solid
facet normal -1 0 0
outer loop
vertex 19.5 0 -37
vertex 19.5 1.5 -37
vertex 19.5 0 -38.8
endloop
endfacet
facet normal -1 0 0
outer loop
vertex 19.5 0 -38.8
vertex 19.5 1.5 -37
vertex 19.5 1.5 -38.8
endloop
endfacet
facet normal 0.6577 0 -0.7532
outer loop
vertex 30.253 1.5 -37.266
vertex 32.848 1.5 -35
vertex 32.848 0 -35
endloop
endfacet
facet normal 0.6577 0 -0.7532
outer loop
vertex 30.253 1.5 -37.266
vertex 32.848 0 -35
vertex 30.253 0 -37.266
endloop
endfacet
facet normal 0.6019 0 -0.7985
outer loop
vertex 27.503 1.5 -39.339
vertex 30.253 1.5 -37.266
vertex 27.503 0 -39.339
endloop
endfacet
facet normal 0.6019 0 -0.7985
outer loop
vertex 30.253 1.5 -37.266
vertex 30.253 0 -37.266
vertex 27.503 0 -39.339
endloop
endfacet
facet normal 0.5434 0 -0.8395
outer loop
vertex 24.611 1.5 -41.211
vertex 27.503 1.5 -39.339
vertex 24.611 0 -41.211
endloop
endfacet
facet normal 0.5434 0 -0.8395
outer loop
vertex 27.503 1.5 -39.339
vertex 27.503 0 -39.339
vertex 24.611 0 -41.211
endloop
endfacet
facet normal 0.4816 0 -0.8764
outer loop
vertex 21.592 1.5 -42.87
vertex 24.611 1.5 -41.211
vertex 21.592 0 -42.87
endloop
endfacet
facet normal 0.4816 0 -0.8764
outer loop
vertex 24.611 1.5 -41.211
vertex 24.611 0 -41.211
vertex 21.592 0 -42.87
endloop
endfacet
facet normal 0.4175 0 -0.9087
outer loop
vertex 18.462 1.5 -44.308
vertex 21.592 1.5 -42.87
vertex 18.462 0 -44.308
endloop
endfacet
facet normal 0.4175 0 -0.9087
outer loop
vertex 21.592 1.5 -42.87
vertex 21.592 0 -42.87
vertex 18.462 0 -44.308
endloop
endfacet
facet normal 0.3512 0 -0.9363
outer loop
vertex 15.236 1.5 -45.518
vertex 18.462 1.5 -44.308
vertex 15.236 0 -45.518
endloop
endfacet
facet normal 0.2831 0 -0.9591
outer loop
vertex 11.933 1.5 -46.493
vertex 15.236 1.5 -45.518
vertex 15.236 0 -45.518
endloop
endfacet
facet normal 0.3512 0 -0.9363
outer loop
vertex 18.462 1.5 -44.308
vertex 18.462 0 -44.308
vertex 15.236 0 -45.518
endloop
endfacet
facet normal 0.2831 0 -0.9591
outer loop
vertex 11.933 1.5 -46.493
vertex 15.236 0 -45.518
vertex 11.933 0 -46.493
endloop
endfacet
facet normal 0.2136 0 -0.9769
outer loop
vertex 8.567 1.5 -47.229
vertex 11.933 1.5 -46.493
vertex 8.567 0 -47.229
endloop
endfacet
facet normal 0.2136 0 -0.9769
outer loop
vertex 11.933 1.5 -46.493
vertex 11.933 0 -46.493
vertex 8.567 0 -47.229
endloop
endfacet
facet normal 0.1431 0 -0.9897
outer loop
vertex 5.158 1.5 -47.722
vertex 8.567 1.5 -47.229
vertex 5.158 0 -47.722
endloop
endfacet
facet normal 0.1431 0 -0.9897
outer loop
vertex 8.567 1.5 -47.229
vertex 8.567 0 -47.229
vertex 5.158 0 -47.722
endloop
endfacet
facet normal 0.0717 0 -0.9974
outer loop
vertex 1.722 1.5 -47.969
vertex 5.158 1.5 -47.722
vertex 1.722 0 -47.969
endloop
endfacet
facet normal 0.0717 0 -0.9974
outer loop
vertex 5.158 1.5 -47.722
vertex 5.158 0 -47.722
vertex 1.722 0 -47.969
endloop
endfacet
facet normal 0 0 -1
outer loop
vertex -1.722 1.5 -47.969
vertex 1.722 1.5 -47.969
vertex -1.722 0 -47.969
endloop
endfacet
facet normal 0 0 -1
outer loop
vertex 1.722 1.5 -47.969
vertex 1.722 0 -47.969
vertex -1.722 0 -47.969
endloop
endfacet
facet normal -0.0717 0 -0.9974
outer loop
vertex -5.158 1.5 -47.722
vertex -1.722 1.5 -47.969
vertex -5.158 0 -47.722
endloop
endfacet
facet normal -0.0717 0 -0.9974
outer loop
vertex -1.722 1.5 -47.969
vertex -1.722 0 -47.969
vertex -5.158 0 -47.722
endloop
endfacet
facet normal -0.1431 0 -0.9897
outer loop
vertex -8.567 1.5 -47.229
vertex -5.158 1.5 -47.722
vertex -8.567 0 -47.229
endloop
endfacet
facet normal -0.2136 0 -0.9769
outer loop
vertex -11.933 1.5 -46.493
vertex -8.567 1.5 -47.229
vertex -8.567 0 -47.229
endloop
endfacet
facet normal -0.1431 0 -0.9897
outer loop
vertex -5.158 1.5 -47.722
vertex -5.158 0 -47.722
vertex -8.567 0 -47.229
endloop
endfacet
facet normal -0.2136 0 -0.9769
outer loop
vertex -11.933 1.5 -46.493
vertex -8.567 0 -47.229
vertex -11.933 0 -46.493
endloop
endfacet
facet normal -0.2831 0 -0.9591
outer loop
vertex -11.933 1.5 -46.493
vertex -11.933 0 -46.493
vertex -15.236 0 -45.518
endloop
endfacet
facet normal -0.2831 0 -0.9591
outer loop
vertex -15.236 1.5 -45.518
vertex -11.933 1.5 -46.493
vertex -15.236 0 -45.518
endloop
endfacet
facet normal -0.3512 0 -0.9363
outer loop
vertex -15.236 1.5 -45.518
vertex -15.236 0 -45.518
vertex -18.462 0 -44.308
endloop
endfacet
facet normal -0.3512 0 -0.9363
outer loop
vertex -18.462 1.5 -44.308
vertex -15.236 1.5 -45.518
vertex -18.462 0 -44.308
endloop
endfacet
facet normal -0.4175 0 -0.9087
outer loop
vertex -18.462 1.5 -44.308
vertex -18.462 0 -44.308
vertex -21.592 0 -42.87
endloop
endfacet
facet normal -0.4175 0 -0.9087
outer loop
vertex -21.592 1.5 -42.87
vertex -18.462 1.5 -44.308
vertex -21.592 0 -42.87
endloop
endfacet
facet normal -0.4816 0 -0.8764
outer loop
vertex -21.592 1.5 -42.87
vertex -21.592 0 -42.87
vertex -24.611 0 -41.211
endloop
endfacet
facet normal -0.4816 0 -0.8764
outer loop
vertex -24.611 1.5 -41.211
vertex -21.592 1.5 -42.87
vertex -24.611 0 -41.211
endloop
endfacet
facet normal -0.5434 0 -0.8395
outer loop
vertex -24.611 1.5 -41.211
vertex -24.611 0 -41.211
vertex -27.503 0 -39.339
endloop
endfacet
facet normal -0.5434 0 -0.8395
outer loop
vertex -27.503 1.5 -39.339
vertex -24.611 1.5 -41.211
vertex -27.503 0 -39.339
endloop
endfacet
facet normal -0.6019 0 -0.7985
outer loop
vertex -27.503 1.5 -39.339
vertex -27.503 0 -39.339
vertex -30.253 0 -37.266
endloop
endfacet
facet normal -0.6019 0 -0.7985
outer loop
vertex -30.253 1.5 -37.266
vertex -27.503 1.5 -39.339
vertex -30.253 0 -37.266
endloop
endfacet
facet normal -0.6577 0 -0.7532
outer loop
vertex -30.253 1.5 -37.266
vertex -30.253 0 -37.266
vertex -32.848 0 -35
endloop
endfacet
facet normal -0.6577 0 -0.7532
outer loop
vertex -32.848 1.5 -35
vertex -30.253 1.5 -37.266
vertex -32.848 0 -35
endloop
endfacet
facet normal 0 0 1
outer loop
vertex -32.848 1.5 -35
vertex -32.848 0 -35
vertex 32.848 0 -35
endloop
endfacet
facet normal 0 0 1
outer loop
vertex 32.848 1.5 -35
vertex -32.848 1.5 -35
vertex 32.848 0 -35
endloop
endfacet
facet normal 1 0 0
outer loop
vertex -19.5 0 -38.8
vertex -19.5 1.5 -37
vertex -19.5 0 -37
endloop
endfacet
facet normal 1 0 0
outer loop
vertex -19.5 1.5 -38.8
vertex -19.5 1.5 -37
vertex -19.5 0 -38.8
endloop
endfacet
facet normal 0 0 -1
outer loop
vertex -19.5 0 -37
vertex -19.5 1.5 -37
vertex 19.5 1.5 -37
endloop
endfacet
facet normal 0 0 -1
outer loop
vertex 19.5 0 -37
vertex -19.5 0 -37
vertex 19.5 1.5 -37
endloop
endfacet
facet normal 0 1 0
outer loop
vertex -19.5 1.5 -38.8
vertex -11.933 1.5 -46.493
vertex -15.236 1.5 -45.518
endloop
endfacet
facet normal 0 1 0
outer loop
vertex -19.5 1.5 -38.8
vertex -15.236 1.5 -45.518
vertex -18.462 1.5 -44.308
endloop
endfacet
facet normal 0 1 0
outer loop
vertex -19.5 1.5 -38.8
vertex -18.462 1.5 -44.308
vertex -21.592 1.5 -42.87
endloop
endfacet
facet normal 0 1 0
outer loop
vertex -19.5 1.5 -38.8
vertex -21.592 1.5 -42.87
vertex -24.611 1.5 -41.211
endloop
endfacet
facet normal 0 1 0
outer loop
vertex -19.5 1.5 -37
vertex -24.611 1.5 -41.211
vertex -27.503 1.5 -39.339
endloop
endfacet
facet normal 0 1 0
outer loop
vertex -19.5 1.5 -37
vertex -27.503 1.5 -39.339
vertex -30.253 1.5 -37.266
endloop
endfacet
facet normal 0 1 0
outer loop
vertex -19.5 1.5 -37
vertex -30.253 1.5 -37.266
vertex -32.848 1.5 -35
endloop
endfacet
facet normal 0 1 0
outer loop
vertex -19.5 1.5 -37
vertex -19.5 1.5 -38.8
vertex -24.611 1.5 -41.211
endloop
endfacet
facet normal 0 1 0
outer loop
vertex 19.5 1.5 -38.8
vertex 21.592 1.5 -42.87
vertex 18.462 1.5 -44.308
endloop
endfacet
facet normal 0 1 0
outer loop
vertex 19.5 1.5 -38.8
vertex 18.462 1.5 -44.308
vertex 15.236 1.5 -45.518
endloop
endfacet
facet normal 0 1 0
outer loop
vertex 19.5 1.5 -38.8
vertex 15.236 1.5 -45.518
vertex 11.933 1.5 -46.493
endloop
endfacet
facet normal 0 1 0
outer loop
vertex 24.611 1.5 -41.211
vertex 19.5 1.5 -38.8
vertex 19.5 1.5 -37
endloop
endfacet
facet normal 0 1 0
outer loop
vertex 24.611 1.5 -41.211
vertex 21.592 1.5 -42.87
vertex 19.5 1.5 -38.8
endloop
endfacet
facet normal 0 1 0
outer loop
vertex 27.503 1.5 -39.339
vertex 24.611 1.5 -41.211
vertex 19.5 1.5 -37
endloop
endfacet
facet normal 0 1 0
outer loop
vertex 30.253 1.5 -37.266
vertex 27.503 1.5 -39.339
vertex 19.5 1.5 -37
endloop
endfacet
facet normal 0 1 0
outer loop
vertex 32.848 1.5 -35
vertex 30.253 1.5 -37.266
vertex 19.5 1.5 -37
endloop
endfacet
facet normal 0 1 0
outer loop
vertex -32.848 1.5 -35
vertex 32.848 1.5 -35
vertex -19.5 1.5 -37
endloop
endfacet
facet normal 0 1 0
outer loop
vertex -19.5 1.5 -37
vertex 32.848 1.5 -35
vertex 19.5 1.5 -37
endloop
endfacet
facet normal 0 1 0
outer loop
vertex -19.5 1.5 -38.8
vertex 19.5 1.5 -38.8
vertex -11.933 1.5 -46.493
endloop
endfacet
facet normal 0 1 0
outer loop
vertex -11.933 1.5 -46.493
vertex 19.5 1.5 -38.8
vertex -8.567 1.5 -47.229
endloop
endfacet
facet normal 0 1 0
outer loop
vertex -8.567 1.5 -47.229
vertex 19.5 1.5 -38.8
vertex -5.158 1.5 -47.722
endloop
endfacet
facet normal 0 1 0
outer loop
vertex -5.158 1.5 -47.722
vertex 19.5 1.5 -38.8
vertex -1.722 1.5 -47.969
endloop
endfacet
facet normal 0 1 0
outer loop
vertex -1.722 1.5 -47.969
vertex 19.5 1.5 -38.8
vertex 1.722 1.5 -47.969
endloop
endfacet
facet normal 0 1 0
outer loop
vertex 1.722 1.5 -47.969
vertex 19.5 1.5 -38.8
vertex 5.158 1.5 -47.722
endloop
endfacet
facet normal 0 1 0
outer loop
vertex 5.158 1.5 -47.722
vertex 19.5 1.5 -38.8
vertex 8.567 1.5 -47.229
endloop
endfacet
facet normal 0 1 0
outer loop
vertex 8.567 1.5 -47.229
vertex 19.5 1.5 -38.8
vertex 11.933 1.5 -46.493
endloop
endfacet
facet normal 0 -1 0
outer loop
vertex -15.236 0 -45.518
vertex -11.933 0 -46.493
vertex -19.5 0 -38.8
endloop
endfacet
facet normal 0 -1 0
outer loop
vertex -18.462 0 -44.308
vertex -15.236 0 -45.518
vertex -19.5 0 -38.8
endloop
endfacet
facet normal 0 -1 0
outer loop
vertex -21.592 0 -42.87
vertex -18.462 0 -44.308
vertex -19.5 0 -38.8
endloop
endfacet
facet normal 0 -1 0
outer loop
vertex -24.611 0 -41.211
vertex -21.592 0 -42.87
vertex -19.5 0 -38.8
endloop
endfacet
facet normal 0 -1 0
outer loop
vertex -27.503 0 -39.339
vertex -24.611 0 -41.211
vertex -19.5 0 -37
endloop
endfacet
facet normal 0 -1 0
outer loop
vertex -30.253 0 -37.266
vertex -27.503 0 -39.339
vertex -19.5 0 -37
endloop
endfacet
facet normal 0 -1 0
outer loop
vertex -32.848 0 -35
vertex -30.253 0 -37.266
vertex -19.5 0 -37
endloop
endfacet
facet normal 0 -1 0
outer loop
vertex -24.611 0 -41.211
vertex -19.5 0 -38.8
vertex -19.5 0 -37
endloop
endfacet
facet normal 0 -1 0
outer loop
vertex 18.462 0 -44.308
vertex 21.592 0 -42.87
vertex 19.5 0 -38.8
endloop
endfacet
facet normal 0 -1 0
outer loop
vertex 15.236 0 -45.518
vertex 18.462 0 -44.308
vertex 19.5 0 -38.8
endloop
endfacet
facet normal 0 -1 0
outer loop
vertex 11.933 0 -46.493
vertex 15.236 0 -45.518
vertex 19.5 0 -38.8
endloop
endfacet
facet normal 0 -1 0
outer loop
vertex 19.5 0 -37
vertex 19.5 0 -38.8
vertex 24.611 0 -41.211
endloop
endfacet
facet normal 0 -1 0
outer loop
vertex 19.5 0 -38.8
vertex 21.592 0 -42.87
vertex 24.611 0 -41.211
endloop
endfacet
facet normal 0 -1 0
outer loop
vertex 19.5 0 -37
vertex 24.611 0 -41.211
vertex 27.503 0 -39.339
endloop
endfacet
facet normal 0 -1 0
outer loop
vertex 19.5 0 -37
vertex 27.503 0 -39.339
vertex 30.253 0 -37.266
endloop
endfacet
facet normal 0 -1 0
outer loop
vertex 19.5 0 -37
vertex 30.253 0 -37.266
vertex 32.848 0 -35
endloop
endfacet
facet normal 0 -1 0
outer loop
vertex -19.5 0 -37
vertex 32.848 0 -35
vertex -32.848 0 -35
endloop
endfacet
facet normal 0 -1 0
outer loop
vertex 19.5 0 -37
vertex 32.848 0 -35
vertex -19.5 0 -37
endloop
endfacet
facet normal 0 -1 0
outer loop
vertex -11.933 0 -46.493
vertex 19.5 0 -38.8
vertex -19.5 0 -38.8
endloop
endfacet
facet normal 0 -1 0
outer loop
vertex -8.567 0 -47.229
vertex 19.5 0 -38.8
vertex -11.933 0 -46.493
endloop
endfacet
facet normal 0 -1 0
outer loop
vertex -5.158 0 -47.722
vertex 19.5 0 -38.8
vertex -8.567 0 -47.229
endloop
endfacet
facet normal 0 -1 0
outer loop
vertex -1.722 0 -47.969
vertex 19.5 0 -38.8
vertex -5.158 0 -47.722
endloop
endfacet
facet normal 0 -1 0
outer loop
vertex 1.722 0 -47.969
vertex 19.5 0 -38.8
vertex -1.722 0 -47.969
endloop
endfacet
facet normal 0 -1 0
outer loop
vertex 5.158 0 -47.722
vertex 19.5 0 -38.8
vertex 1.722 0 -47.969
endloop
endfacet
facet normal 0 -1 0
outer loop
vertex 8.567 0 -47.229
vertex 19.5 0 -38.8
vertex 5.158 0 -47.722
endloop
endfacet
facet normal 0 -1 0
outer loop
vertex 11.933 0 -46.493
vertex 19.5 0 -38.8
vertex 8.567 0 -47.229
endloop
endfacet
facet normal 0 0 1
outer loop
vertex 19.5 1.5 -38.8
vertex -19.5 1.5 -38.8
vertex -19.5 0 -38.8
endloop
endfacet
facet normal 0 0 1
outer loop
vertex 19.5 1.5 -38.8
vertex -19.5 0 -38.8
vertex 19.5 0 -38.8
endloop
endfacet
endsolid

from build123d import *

# Parameters (mm, degrees)
SKETCH1_R           = 48
BOSS_EXTRUDE1_DEPTH = 1.5
CUT_EXTRUDE1_START  = -1.5
CUT_EXTRUDE1_DEPTH  = 1.5
SKETCH3_W           = 39
SKETCH3_H           = 1.8
CUT_EXTRUDE2_DEPTH  = 1.5


with BuildPart() as part:
    # Sketch1 → Boss-Extrude1 (new body)
    with BuildSketch(Plane(origin=(0, 0, 0), x_dir=(1, 0, 0), z_dir=(0, 1, 0))):
        with Locations(Location((0, 0, 0), (0, 0, 270))):
            Circle(SKETCH1_R)
    extrude(amount=BOSS_EXTRUDE1_DEPTH)

    # Sketch2 → Cut-Extrude1 (cut)
    with BuildSketch(Plane(origin=(0, 1.5, 0), x_dir=(1, 0, 0), z_dir=(0, 1, 0)).offset(CUT_EXTRUDE1_START)):
        with BuildLine():
            Line((-32.848135411, 35), (32.848135411, 35))
            ThreePointArc((32.848135411, 35), (0, -48), (-32.848135411, 35))
        make_face()
    extrude(amount=CUT_EXTRUDE1_DEPTH, mode=Mode.SUBTRACT)

    # Sketch3 → Cut-Extrude2 (cut)
    with BuildSketch(Plane(origin=(0, 1.5, 0), x_dir=(1, 0, 0), z_dir=(0, 1, 0))):
        with Locations((0, 37.9)):
            Rectangle(SKETCH3_W, SKETCH3_H)
    extrude(amount=-CUT_EXTRUDE2_DEPTH, mode=Mode.SUBTRACT)


solid = part.part
